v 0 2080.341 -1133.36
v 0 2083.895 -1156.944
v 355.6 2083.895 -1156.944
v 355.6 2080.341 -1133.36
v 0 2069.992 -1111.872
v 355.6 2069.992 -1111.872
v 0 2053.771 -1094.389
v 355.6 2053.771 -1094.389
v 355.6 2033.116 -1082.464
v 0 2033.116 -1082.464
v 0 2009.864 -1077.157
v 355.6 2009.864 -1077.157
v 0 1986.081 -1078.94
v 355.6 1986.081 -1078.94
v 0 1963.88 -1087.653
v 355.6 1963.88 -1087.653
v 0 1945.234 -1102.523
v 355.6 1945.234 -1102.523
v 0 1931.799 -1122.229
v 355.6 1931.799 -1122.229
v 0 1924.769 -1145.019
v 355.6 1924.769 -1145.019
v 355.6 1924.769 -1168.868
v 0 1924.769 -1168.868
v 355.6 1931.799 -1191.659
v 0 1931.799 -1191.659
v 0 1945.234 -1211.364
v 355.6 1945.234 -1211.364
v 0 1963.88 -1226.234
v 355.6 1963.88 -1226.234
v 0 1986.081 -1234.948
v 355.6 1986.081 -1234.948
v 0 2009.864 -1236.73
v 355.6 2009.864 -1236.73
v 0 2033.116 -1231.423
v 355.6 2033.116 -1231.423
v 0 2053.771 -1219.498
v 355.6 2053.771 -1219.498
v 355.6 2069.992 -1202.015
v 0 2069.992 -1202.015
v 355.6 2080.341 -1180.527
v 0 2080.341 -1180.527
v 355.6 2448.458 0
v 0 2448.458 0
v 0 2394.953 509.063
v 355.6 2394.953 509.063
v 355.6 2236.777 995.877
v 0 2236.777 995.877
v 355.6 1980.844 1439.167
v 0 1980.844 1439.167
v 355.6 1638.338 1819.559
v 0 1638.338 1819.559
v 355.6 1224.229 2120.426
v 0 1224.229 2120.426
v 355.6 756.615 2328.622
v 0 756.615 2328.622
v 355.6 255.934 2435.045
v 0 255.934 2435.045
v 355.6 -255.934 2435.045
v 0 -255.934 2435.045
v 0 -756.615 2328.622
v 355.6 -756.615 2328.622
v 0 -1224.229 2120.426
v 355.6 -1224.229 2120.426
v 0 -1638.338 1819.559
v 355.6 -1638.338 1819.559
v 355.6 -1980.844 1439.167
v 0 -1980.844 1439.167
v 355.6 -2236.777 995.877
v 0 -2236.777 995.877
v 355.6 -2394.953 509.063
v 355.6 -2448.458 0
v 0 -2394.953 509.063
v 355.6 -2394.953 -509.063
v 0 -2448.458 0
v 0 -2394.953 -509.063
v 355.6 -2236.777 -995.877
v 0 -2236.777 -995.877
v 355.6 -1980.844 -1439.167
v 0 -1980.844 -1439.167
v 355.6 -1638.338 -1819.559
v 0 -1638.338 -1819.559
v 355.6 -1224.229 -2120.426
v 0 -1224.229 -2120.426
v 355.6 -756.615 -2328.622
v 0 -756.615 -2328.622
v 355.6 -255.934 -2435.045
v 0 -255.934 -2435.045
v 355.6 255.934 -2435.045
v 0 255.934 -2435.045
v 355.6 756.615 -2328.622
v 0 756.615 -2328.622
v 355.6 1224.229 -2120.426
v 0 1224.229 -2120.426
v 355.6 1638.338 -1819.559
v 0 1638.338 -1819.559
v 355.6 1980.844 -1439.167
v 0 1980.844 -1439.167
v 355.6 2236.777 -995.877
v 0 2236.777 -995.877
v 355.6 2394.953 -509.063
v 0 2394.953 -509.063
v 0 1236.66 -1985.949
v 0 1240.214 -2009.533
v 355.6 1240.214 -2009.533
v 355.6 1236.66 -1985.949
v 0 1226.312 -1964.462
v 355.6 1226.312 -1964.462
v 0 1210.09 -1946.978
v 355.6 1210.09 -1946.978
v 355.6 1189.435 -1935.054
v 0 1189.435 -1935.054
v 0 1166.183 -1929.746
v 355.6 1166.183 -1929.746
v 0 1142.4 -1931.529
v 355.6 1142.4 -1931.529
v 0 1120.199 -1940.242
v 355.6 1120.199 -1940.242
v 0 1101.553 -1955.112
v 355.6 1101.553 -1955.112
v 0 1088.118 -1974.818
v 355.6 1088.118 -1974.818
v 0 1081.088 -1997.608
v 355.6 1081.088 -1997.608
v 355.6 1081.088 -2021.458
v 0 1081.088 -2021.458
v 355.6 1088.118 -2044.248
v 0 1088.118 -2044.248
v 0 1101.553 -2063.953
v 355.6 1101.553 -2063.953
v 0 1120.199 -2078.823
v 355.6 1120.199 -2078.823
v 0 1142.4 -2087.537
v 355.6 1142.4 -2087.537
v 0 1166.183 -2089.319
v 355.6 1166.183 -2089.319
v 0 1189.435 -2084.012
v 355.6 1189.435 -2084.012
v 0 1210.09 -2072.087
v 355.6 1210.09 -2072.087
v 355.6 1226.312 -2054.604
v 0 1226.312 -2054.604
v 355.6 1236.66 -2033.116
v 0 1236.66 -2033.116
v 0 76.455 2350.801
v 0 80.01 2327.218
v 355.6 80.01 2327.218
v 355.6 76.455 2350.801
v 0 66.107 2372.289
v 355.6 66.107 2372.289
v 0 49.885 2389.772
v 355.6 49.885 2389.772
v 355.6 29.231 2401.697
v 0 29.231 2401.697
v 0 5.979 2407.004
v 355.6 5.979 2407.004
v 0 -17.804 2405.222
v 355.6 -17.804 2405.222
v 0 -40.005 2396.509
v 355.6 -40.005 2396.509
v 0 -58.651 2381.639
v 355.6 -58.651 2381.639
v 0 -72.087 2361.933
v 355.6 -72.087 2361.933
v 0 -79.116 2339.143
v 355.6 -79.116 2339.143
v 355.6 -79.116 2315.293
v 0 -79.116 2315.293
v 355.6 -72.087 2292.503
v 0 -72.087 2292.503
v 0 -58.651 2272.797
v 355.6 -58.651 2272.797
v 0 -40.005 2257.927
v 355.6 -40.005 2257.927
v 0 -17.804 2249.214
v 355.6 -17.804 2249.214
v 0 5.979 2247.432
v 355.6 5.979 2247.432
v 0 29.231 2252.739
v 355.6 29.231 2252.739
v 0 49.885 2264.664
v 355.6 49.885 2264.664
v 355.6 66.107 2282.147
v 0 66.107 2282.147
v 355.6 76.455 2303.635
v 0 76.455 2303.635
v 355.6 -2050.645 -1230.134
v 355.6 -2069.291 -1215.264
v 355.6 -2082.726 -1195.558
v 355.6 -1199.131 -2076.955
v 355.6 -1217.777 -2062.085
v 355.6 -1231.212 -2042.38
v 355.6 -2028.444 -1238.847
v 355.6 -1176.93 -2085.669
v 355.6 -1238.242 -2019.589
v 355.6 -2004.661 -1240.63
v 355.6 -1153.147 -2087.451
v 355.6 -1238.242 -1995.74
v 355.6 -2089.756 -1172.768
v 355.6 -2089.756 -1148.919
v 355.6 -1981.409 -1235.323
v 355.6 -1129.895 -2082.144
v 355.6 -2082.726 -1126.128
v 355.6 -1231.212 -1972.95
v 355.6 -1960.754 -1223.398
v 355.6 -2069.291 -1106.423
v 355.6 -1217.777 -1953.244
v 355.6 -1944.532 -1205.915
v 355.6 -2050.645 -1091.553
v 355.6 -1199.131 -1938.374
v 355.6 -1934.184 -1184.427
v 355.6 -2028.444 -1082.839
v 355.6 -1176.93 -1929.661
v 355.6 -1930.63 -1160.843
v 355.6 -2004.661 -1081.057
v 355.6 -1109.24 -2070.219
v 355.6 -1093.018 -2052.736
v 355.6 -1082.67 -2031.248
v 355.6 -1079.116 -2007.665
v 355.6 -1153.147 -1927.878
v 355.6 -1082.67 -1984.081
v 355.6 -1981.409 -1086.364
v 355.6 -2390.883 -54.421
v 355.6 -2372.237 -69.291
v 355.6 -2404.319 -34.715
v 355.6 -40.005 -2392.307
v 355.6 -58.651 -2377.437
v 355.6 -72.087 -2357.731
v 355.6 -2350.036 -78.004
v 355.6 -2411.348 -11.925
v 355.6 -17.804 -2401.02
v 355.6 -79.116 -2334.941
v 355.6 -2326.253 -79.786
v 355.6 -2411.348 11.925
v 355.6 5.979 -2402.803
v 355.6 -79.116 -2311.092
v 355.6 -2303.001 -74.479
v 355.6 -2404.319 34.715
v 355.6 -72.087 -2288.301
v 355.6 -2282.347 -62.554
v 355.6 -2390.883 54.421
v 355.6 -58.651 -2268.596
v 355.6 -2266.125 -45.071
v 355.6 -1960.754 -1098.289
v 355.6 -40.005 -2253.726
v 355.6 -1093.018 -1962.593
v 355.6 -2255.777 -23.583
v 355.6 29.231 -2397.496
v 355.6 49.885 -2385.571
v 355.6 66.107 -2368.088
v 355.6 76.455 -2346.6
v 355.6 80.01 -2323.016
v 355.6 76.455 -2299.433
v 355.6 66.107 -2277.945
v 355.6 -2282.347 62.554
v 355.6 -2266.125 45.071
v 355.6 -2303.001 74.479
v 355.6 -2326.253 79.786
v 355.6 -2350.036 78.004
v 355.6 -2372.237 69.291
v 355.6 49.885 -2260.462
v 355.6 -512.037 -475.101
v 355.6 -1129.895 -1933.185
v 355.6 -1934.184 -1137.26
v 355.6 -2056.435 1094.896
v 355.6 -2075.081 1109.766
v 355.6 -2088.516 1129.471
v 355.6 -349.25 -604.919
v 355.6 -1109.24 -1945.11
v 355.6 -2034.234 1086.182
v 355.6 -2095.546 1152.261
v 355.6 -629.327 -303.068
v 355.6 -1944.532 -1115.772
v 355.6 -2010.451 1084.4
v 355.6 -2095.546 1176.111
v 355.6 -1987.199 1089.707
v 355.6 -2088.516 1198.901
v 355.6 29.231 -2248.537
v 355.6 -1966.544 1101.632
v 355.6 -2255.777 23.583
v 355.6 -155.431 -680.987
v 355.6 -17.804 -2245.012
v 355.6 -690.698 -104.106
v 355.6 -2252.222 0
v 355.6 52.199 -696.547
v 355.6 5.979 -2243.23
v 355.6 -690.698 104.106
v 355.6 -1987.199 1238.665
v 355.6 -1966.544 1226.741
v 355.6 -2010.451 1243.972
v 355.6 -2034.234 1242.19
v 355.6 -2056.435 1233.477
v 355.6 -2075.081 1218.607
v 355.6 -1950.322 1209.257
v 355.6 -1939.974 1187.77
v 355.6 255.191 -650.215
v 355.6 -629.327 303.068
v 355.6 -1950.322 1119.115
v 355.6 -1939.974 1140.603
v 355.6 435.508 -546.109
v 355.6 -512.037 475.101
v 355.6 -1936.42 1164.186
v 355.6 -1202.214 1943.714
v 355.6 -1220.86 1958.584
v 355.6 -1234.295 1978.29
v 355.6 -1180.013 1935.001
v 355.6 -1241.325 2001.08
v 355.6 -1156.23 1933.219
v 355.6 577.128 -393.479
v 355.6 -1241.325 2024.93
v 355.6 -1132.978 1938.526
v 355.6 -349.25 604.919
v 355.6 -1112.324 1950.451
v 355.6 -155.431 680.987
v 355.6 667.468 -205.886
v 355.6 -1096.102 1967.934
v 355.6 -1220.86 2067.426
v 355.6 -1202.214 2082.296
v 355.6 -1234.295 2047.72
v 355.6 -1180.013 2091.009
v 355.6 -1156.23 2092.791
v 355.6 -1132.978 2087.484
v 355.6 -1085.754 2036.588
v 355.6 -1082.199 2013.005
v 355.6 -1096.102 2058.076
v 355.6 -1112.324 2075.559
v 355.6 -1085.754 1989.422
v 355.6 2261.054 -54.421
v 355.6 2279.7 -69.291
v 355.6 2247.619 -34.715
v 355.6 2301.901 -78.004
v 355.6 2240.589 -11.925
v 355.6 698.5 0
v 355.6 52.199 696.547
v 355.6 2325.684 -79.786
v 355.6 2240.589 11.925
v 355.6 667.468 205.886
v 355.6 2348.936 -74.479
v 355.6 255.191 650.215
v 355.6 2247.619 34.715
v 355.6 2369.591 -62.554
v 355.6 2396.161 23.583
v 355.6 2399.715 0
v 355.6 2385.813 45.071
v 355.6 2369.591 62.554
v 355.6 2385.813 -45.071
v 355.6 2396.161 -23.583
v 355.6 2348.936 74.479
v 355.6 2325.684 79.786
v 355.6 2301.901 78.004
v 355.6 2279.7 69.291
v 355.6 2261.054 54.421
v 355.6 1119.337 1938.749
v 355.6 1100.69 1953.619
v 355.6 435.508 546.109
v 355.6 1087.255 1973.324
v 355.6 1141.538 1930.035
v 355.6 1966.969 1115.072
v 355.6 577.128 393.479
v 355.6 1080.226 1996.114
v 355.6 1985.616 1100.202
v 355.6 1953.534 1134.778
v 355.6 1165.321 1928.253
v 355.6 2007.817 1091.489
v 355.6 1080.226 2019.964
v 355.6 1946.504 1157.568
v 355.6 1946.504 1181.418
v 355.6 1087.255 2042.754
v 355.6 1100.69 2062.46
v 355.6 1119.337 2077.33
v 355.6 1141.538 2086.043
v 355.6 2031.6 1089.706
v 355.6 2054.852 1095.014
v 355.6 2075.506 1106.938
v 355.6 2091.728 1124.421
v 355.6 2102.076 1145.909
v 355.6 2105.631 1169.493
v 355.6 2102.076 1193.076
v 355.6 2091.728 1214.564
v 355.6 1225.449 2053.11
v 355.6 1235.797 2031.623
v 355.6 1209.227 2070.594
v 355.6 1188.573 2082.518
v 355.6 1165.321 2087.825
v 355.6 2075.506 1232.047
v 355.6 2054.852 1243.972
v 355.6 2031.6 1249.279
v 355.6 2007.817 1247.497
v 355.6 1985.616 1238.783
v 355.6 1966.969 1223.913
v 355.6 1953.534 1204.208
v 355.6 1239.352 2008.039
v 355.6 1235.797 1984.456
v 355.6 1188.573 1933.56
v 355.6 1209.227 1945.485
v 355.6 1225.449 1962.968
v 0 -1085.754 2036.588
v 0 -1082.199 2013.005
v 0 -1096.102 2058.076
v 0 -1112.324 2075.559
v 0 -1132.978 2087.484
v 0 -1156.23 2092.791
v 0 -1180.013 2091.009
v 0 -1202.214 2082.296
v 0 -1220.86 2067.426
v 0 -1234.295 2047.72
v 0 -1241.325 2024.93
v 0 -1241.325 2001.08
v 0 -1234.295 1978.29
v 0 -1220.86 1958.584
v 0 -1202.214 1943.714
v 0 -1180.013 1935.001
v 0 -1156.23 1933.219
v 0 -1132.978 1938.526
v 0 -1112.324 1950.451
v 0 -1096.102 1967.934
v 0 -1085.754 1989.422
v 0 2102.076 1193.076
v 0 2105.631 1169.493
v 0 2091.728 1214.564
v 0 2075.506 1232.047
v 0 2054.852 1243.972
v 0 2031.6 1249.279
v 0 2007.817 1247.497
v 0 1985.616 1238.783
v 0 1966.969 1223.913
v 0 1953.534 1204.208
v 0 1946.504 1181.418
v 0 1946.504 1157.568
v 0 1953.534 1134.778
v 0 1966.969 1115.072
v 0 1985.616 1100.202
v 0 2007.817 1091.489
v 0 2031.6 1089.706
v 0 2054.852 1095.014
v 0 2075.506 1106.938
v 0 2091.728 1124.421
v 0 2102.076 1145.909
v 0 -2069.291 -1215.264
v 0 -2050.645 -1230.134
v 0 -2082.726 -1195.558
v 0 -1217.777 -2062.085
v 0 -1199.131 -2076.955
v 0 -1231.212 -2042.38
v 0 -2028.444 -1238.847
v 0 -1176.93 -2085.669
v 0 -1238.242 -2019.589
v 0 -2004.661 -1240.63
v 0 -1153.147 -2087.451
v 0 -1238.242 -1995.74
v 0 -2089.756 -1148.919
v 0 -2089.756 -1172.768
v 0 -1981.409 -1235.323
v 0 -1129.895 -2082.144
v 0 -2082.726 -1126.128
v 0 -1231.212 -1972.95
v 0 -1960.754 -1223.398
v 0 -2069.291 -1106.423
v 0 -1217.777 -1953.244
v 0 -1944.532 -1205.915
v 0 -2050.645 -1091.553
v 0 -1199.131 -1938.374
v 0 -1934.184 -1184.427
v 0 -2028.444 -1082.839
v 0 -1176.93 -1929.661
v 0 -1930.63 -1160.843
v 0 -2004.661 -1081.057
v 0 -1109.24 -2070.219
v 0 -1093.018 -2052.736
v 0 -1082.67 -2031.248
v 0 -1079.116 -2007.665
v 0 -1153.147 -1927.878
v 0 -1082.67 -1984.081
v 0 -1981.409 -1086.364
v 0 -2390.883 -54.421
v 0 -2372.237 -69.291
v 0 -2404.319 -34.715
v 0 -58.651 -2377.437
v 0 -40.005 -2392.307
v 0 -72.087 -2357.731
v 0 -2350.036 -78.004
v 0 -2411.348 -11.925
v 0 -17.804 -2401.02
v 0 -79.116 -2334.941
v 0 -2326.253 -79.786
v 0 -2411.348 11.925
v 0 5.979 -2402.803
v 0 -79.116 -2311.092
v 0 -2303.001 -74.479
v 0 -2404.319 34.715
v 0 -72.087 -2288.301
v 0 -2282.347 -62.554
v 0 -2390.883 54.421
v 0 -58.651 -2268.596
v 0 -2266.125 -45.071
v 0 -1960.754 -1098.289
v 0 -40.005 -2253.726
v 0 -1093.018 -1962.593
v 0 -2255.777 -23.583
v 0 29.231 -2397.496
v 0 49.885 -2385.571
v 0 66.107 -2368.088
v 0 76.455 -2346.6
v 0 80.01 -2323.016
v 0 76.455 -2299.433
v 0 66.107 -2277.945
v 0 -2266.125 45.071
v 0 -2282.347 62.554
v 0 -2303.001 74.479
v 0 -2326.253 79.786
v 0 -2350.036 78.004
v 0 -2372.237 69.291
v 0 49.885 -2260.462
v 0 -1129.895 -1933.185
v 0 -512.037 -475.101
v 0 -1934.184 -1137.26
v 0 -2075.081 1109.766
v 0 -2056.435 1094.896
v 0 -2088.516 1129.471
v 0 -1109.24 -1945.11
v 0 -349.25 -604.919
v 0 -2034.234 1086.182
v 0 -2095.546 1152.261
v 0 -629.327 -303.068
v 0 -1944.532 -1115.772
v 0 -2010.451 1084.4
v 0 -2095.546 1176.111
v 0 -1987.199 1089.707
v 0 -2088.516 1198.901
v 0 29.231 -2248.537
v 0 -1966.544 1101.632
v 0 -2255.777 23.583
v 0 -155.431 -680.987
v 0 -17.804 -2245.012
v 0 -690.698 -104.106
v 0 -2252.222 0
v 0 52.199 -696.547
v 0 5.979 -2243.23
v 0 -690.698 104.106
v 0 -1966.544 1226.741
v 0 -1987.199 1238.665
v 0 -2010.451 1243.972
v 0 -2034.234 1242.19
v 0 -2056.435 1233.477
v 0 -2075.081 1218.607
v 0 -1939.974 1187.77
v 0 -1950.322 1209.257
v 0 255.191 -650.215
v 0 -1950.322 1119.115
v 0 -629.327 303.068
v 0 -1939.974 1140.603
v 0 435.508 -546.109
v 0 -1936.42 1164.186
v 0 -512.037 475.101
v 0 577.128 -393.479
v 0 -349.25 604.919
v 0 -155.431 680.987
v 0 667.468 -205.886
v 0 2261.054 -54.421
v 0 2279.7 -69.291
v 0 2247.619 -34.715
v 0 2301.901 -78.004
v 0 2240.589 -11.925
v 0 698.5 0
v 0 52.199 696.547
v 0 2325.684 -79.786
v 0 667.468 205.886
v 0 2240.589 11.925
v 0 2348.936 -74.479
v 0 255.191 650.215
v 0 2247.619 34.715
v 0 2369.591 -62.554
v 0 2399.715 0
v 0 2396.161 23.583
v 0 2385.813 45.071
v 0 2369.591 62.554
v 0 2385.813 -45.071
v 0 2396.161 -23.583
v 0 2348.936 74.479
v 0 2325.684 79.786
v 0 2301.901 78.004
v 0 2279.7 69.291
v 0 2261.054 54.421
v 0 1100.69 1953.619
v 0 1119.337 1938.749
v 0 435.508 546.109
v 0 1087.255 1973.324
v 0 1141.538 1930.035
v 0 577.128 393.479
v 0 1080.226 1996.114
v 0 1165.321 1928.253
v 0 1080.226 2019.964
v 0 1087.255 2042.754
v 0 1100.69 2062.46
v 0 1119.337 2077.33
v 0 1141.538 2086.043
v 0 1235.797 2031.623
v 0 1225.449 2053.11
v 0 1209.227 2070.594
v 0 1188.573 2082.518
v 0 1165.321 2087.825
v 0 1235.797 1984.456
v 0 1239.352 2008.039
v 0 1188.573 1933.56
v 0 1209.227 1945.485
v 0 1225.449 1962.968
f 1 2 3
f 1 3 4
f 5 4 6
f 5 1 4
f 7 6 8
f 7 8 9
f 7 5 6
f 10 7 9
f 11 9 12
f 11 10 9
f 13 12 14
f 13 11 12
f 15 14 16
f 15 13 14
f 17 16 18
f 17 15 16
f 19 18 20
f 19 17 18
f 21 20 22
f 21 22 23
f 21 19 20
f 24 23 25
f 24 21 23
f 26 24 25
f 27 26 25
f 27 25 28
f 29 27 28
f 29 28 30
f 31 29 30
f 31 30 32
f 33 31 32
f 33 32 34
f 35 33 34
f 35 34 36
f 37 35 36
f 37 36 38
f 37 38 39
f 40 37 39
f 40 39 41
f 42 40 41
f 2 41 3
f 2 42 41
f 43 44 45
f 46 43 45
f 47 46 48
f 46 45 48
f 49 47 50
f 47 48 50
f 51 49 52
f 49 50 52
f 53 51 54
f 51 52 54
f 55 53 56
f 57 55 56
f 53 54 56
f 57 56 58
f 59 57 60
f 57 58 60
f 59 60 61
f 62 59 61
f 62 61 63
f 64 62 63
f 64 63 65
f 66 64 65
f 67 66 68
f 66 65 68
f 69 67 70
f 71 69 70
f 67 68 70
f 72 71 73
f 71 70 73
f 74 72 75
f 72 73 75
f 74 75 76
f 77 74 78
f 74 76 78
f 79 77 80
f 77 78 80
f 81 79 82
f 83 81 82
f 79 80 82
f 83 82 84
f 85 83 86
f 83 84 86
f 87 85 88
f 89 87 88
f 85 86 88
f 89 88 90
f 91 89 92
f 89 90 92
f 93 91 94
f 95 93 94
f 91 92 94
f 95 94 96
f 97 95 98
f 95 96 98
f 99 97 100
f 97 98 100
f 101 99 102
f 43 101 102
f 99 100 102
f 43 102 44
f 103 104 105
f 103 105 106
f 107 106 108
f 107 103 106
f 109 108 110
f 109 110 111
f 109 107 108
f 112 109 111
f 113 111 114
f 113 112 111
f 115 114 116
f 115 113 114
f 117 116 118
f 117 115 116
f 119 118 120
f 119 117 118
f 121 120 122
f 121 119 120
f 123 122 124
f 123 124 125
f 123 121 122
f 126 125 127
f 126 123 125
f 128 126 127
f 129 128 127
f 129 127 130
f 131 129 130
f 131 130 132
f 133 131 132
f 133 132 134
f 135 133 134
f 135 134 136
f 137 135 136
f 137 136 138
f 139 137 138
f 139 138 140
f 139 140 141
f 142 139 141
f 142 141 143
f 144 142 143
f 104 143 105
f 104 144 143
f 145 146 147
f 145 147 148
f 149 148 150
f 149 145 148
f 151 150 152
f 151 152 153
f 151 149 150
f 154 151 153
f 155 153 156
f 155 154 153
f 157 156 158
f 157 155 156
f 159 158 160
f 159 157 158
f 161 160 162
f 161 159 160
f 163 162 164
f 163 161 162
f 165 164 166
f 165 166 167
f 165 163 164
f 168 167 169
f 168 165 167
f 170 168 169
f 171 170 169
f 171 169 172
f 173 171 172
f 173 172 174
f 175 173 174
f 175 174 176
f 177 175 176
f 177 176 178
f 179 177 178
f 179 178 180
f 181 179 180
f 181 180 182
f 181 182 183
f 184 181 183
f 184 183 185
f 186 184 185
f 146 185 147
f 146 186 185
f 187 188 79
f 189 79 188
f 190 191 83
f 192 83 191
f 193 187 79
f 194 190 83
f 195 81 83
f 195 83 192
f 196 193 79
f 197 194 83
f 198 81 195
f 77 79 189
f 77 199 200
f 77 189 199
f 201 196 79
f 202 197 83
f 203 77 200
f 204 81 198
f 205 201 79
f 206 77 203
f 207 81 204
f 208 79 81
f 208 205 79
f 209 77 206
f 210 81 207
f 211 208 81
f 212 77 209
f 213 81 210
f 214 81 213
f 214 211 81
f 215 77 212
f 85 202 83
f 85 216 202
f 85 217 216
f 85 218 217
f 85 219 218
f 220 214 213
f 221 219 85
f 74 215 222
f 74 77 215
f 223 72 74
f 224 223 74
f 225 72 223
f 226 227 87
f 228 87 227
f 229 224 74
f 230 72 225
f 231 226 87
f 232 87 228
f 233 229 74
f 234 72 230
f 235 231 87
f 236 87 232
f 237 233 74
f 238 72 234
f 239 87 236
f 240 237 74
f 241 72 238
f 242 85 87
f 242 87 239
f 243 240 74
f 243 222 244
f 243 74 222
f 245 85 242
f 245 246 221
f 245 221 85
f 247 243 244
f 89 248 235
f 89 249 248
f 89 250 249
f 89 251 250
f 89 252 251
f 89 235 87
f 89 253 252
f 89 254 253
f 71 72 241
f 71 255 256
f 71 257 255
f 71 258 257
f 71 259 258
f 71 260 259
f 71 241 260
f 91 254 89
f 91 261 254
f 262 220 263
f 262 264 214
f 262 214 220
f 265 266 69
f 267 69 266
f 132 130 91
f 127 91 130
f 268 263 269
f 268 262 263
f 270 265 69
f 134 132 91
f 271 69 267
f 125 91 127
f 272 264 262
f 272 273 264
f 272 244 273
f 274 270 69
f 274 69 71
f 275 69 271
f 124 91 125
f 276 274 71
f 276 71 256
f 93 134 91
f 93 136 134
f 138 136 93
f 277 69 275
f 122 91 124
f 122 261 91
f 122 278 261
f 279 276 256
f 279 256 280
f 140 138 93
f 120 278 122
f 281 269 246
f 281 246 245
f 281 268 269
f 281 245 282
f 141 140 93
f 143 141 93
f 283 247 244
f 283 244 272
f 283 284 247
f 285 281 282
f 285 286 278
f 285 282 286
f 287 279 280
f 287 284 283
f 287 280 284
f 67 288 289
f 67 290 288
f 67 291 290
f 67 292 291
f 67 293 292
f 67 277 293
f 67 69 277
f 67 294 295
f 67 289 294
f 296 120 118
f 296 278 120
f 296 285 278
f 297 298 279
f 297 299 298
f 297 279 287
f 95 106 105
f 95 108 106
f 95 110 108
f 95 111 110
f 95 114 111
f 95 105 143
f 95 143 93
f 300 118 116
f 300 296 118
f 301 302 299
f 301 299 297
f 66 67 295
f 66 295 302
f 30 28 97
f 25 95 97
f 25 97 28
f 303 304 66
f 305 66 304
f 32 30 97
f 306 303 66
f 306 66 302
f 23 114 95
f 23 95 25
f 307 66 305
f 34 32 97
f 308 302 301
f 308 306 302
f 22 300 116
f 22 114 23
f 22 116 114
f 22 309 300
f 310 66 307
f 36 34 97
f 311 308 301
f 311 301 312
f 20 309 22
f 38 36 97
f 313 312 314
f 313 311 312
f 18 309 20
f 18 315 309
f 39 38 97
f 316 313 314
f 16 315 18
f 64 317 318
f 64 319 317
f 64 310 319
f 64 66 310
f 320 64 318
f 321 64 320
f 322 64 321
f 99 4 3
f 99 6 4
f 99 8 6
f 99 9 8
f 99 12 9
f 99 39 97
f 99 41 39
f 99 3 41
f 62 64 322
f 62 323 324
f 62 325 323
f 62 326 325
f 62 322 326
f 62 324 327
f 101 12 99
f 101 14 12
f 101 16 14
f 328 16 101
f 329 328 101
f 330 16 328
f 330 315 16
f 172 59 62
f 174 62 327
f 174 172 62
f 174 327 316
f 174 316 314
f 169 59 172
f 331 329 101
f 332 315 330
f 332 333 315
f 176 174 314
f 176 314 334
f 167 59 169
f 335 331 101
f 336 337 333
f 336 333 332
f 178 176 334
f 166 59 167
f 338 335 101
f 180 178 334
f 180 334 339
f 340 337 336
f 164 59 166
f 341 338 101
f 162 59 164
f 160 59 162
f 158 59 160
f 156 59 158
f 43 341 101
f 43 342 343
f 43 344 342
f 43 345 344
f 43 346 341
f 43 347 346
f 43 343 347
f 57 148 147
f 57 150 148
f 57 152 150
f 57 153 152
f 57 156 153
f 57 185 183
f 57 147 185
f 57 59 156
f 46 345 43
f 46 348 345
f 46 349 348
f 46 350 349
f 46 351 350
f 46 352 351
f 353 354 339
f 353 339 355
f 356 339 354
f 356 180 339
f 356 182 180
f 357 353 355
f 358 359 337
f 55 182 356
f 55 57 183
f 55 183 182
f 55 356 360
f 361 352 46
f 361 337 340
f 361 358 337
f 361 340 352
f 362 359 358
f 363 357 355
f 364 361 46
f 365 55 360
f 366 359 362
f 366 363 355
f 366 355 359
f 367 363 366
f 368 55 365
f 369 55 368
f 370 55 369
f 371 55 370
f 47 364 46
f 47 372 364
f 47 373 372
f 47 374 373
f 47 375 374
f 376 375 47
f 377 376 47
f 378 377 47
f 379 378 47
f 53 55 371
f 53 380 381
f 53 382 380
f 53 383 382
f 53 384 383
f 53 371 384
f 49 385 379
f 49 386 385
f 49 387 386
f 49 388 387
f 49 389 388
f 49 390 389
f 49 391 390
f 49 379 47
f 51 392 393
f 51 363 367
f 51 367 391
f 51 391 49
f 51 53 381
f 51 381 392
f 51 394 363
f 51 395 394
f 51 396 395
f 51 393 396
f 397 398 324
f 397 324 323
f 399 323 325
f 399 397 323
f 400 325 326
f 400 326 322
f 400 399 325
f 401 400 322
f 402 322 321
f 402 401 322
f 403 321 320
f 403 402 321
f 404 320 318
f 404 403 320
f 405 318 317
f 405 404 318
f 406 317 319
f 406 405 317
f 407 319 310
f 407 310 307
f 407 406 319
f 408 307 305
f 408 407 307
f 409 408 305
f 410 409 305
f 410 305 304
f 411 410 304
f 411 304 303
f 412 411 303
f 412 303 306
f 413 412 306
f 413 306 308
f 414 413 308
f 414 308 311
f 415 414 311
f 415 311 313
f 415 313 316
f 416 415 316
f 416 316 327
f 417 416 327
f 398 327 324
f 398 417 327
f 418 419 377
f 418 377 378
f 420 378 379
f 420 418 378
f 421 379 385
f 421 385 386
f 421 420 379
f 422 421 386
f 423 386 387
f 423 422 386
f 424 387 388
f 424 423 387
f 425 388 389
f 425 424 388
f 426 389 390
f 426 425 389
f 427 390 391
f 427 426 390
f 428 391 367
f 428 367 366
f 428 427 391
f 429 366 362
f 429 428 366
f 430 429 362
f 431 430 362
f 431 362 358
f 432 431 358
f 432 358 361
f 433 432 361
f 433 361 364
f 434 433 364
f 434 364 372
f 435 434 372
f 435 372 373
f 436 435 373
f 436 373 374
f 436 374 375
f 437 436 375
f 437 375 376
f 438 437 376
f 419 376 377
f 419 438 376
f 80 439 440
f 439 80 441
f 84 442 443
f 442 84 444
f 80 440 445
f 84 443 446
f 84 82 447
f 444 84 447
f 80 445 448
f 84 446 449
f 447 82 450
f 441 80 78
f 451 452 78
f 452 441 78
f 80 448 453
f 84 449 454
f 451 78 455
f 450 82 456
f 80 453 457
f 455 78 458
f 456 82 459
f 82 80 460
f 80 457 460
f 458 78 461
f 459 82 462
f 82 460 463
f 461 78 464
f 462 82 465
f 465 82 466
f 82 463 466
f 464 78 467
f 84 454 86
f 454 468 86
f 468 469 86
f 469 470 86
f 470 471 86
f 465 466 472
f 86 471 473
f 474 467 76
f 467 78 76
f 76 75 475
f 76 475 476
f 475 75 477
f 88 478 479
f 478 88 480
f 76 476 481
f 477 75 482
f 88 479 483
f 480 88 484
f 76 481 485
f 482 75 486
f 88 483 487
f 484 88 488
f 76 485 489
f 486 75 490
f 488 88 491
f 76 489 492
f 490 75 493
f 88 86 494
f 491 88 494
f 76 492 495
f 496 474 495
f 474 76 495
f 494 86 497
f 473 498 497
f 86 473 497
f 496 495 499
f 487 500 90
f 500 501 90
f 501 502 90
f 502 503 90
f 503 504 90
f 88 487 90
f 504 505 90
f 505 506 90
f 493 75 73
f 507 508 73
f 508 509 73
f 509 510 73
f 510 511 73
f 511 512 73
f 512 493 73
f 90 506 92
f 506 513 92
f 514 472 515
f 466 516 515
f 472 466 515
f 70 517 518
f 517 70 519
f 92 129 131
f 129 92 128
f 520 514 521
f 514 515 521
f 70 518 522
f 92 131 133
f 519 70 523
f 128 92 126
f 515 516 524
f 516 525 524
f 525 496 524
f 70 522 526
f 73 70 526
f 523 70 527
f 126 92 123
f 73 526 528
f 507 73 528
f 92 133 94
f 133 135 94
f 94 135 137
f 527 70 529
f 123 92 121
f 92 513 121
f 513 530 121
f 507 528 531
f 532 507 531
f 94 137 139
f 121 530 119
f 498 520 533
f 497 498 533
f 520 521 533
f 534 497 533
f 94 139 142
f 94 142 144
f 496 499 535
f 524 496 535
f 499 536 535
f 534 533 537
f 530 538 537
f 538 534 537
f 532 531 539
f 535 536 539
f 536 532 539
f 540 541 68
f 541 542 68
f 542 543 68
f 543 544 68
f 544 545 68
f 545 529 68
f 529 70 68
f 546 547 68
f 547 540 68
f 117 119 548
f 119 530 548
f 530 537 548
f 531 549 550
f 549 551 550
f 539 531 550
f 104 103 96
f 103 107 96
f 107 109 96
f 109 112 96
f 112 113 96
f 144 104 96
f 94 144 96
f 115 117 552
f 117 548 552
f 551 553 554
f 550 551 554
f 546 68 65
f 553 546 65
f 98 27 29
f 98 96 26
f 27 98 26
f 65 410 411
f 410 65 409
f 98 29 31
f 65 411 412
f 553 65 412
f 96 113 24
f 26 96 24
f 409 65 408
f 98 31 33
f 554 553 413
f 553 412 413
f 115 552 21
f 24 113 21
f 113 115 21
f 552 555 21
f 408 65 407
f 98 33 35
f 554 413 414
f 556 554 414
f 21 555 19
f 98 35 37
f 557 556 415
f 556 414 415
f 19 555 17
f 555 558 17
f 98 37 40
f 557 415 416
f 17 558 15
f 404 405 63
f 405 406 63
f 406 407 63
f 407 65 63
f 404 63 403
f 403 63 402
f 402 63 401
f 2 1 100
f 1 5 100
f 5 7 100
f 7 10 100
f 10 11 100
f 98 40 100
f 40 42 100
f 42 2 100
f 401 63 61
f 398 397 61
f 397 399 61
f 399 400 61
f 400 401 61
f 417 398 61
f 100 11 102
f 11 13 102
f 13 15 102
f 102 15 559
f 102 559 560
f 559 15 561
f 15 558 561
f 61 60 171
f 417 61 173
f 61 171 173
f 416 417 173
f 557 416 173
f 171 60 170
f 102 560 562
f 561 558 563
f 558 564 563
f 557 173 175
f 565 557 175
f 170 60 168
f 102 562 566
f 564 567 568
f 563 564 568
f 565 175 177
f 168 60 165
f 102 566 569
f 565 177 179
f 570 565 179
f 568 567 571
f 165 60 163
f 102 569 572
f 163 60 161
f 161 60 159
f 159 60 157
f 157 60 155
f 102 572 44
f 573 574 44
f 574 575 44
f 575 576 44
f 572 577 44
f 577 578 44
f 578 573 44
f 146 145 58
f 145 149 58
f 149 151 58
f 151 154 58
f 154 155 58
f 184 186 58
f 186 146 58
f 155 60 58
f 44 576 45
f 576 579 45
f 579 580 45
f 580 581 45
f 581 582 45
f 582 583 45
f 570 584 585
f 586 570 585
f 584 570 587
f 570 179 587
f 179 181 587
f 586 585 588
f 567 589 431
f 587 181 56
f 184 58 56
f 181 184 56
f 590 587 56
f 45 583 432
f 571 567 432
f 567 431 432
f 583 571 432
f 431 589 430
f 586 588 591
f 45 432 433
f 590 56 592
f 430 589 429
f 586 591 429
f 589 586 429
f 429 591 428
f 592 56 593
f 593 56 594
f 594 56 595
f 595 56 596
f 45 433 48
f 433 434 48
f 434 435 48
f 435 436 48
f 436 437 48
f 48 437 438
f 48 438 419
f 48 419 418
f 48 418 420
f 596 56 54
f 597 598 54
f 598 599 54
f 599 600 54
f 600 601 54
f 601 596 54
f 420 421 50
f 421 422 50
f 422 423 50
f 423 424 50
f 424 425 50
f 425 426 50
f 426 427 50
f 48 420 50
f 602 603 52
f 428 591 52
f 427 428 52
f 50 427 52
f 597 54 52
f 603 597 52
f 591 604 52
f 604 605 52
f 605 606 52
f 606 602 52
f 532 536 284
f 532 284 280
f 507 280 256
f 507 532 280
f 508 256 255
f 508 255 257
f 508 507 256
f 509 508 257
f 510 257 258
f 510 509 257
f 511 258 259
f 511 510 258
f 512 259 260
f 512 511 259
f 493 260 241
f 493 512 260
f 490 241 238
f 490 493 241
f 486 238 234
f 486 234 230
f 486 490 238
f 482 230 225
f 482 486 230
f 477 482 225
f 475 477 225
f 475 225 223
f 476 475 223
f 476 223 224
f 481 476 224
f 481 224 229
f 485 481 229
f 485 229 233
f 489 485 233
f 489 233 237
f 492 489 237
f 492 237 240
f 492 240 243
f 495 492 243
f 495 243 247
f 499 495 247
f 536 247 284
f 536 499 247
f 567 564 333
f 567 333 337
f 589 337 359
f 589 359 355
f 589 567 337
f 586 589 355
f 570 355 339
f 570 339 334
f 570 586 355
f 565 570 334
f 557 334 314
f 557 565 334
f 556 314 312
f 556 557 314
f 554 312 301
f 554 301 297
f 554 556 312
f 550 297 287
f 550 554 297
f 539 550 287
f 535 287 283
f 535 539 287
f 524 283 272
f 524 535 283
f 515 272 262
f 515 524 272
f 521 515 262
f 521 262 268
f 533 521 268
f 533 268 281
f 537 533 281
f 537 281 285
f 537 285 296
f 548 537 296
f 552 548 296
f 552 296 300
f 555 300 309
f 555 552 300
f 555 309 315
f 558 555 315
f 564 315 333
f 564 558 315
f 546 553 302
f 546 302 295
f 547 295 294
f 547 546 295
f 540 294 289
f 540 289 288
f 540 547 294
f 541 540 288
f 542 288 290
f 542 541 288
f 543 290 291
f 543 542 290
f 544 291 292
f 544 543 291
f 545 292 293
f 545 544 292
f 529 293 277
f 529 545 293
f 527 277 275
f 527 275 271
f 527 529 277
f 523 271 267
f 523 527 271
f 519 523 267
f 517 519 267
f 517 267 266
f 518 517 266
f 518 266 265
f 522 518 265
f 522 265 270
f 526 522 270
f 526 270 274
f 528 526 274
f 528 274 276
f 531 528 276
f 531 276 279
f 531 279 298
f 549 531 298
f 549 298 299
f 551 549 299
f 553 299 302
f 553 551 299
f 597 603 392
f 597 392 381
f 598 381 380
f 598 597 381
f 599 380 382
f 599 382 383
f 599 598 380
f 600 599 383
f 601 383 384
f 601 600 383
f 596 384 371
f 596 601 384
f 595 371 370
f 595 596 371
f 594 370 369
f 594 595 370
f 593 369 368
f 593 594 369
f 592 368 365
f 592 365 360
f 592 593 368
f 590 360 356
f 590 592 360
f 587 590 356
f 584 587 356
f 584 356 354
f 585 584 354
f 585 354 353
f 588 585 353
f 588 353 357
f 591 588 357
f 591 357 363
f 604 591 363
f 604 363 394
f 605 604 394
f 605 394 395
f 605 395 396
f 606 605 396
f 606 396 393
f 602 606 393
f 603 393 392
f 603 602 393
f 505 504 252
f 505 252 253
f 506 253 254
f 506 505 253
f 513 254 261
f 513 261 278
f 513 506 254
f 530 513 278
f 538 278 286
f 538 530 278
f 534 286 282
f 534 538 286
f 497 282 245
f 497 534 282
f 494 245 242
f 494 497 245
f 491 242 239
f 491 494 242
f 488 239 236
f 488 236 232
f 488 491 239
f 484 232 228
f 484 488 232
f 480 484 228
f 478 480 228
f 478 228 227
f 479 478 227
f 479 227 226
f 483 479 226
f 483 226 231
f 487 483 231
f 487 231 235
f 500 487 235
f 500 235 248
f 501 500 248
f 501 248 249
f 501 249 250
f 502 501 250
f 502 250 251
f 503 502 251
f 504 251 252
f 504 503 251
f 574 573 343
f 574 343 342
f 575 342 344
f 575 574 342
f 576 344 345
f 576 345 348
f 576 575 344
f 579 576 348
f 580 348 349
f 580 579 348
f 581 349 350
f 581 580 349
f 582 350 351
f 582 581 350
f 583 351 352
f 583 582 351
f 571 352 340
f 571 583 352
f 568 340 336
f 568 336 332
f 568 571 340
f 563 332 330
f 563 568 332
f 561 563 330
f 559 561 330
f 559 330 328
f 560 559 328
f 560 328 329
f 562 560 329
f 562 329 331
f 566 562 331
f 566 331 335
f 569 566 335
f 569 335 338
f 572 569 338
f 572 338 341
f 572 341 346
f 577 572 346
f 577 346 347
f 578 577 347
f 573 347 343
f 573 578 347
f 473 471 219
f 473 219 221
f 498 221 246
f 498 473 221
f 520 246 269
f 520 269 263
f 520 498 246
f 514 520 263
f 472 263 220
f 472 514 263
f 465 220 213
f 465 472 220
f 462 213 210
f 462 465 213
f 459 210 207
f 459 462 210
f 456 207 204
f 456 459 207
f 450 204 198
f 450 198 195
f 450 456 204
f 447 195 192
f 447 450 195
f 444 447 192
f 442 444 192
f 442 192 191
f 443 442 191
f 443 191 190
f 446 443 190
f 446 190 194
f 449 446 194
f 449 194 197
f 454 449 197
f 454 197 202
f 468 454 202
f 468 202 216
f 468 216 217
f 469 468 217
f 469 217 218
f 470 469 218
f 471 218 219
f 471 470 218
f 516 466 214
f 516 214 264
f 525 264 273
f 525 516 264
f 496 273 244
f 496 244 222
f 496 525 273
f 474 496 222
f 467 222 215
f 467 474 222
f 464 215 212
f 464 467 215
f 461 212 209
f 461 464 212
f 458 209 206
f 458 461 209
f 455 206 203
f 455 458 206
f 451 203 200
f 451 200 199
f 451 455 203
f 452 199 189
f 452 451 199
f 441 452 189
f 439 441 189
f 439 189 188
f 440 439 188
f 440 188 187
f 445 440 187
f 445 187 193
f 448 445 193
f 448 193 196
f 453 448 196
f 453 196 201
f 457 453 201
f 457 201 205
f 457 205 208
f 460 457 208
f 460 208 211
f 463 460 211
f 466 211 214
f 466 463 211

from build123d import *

# Parameters (mm, degrees)
F0_R     = 2448.457552237
F0_R_2   = 80.01
F0_R_3   = 2192.02
F0_R_4   = 698.5
F1_DEPTH = 355.6


# Not quite as in the source:
# - a feature names something its author has since deleted; it is built from what else it names


with BuildPart() as f1:
    # F0 (on Right) → F1 (new body)
    with BuildSketch(Plane.YZ):
        Circle(F0_R)
        with Locations((-1159.1256873943, -2007.6645829251)):
            Circle(F0_R_2, mode=Mode.SUBTRACT)
        with Locations((-2010.6397344548, -1160.8433919308)):
            Circle(F0_R_2, mode=Mode.SUBTRACT)
        with Locations((0, -2323.0164051056)):
            Circle(F0_R_2, mode=Mode.SUBTRACT)
        with Locations((1160.2042772772, -2009.5327554028)):
            Circle(F0_R_2, mode=Mode.SUBTRACT)
        with Locations((2003.885127001, -1156.9436174991)):
            Circle(F0_R_2, mode=Mode.SUBTRACT)
        with Locations((-2332.2319984436, 0)):
            Circle(F0_R_2, mode=Mode.SUBTRACT)
        with Locations((-2016.4296737363, 1164.1862149336)):
            Circle(F0_R_2, mode=Mode.SUBTRACT)
        with Locations((-1162.2089393996, 2013.0049320509)):
            Circle(F0_R_2, mode=Mode.SUBTRACT)
        Circle(F0_R_3, mode=Mode.SUBTRACT)
        with Locations((2319.705247879, 0)):
            Circle(F0_R_2, mode=Mode.SUBTRACT)
        with Locations((2025.6207910737, 1169.4927090025)):
            Circle(F0_R_2, mode=Mode.SUBTRACT)
        with Locations((0, 2327.2179239424)):
            Circle(F0_R_2, mode=Mode.SUBTRACT)
        with Locations((1159.3419722674, 2008.0391993142)):
            Circle(F0_R_2, mode=Mode.SUBTRACT)
        Circle(F0_R_3)
        with BuildLine():
            ThreePointArc((869.064376413, 0), (-772.1149948812, -398.8876095214), (502.8974287205, 708.7785737001))
            ThreePointArc((502.8974287205, 708.7785737001), (772.1149948812, 398.8876095214), (869.064376413, 0))
        make_face(mode=Mode.SUBTRACT)
        with BuildLine():
            ThreePointArc((869.064376413, 0), (772.1149948812, 398.8876095214), (502.8974287205, 708.7785737001))
            ThreePointArc((502.8974287205, 708.7785737001), (-772.1149948812, -398.8876095214), (869.064376413, 0))
        make_face()
        with BuildLine():
            ThreePointArc((447.4882516835, 616.764350952), (678.83357599, 346.1632217735), (762, 0))
            ThreePointArc((762, 0), (-678.83357599, -346.1632217735), (447.4882516835, 616.764350952))
        make_face(mode=Mode.SUBTRACT)
        with BuildLine():
            ThreePointArc((447.4882516835, 616.764350952), (-678.83357599, -346.1632217735), (762, 0))
            ThreePointArc((762, 0), (678.83357599, 346.1632217735), (447.4882516835, 616.764350952))
        make_face()
        Circle(F0_R_4, mode=Mode.SUBTRACT)
    extrude(amount=F1_DEPTH)


solid = f1.part
